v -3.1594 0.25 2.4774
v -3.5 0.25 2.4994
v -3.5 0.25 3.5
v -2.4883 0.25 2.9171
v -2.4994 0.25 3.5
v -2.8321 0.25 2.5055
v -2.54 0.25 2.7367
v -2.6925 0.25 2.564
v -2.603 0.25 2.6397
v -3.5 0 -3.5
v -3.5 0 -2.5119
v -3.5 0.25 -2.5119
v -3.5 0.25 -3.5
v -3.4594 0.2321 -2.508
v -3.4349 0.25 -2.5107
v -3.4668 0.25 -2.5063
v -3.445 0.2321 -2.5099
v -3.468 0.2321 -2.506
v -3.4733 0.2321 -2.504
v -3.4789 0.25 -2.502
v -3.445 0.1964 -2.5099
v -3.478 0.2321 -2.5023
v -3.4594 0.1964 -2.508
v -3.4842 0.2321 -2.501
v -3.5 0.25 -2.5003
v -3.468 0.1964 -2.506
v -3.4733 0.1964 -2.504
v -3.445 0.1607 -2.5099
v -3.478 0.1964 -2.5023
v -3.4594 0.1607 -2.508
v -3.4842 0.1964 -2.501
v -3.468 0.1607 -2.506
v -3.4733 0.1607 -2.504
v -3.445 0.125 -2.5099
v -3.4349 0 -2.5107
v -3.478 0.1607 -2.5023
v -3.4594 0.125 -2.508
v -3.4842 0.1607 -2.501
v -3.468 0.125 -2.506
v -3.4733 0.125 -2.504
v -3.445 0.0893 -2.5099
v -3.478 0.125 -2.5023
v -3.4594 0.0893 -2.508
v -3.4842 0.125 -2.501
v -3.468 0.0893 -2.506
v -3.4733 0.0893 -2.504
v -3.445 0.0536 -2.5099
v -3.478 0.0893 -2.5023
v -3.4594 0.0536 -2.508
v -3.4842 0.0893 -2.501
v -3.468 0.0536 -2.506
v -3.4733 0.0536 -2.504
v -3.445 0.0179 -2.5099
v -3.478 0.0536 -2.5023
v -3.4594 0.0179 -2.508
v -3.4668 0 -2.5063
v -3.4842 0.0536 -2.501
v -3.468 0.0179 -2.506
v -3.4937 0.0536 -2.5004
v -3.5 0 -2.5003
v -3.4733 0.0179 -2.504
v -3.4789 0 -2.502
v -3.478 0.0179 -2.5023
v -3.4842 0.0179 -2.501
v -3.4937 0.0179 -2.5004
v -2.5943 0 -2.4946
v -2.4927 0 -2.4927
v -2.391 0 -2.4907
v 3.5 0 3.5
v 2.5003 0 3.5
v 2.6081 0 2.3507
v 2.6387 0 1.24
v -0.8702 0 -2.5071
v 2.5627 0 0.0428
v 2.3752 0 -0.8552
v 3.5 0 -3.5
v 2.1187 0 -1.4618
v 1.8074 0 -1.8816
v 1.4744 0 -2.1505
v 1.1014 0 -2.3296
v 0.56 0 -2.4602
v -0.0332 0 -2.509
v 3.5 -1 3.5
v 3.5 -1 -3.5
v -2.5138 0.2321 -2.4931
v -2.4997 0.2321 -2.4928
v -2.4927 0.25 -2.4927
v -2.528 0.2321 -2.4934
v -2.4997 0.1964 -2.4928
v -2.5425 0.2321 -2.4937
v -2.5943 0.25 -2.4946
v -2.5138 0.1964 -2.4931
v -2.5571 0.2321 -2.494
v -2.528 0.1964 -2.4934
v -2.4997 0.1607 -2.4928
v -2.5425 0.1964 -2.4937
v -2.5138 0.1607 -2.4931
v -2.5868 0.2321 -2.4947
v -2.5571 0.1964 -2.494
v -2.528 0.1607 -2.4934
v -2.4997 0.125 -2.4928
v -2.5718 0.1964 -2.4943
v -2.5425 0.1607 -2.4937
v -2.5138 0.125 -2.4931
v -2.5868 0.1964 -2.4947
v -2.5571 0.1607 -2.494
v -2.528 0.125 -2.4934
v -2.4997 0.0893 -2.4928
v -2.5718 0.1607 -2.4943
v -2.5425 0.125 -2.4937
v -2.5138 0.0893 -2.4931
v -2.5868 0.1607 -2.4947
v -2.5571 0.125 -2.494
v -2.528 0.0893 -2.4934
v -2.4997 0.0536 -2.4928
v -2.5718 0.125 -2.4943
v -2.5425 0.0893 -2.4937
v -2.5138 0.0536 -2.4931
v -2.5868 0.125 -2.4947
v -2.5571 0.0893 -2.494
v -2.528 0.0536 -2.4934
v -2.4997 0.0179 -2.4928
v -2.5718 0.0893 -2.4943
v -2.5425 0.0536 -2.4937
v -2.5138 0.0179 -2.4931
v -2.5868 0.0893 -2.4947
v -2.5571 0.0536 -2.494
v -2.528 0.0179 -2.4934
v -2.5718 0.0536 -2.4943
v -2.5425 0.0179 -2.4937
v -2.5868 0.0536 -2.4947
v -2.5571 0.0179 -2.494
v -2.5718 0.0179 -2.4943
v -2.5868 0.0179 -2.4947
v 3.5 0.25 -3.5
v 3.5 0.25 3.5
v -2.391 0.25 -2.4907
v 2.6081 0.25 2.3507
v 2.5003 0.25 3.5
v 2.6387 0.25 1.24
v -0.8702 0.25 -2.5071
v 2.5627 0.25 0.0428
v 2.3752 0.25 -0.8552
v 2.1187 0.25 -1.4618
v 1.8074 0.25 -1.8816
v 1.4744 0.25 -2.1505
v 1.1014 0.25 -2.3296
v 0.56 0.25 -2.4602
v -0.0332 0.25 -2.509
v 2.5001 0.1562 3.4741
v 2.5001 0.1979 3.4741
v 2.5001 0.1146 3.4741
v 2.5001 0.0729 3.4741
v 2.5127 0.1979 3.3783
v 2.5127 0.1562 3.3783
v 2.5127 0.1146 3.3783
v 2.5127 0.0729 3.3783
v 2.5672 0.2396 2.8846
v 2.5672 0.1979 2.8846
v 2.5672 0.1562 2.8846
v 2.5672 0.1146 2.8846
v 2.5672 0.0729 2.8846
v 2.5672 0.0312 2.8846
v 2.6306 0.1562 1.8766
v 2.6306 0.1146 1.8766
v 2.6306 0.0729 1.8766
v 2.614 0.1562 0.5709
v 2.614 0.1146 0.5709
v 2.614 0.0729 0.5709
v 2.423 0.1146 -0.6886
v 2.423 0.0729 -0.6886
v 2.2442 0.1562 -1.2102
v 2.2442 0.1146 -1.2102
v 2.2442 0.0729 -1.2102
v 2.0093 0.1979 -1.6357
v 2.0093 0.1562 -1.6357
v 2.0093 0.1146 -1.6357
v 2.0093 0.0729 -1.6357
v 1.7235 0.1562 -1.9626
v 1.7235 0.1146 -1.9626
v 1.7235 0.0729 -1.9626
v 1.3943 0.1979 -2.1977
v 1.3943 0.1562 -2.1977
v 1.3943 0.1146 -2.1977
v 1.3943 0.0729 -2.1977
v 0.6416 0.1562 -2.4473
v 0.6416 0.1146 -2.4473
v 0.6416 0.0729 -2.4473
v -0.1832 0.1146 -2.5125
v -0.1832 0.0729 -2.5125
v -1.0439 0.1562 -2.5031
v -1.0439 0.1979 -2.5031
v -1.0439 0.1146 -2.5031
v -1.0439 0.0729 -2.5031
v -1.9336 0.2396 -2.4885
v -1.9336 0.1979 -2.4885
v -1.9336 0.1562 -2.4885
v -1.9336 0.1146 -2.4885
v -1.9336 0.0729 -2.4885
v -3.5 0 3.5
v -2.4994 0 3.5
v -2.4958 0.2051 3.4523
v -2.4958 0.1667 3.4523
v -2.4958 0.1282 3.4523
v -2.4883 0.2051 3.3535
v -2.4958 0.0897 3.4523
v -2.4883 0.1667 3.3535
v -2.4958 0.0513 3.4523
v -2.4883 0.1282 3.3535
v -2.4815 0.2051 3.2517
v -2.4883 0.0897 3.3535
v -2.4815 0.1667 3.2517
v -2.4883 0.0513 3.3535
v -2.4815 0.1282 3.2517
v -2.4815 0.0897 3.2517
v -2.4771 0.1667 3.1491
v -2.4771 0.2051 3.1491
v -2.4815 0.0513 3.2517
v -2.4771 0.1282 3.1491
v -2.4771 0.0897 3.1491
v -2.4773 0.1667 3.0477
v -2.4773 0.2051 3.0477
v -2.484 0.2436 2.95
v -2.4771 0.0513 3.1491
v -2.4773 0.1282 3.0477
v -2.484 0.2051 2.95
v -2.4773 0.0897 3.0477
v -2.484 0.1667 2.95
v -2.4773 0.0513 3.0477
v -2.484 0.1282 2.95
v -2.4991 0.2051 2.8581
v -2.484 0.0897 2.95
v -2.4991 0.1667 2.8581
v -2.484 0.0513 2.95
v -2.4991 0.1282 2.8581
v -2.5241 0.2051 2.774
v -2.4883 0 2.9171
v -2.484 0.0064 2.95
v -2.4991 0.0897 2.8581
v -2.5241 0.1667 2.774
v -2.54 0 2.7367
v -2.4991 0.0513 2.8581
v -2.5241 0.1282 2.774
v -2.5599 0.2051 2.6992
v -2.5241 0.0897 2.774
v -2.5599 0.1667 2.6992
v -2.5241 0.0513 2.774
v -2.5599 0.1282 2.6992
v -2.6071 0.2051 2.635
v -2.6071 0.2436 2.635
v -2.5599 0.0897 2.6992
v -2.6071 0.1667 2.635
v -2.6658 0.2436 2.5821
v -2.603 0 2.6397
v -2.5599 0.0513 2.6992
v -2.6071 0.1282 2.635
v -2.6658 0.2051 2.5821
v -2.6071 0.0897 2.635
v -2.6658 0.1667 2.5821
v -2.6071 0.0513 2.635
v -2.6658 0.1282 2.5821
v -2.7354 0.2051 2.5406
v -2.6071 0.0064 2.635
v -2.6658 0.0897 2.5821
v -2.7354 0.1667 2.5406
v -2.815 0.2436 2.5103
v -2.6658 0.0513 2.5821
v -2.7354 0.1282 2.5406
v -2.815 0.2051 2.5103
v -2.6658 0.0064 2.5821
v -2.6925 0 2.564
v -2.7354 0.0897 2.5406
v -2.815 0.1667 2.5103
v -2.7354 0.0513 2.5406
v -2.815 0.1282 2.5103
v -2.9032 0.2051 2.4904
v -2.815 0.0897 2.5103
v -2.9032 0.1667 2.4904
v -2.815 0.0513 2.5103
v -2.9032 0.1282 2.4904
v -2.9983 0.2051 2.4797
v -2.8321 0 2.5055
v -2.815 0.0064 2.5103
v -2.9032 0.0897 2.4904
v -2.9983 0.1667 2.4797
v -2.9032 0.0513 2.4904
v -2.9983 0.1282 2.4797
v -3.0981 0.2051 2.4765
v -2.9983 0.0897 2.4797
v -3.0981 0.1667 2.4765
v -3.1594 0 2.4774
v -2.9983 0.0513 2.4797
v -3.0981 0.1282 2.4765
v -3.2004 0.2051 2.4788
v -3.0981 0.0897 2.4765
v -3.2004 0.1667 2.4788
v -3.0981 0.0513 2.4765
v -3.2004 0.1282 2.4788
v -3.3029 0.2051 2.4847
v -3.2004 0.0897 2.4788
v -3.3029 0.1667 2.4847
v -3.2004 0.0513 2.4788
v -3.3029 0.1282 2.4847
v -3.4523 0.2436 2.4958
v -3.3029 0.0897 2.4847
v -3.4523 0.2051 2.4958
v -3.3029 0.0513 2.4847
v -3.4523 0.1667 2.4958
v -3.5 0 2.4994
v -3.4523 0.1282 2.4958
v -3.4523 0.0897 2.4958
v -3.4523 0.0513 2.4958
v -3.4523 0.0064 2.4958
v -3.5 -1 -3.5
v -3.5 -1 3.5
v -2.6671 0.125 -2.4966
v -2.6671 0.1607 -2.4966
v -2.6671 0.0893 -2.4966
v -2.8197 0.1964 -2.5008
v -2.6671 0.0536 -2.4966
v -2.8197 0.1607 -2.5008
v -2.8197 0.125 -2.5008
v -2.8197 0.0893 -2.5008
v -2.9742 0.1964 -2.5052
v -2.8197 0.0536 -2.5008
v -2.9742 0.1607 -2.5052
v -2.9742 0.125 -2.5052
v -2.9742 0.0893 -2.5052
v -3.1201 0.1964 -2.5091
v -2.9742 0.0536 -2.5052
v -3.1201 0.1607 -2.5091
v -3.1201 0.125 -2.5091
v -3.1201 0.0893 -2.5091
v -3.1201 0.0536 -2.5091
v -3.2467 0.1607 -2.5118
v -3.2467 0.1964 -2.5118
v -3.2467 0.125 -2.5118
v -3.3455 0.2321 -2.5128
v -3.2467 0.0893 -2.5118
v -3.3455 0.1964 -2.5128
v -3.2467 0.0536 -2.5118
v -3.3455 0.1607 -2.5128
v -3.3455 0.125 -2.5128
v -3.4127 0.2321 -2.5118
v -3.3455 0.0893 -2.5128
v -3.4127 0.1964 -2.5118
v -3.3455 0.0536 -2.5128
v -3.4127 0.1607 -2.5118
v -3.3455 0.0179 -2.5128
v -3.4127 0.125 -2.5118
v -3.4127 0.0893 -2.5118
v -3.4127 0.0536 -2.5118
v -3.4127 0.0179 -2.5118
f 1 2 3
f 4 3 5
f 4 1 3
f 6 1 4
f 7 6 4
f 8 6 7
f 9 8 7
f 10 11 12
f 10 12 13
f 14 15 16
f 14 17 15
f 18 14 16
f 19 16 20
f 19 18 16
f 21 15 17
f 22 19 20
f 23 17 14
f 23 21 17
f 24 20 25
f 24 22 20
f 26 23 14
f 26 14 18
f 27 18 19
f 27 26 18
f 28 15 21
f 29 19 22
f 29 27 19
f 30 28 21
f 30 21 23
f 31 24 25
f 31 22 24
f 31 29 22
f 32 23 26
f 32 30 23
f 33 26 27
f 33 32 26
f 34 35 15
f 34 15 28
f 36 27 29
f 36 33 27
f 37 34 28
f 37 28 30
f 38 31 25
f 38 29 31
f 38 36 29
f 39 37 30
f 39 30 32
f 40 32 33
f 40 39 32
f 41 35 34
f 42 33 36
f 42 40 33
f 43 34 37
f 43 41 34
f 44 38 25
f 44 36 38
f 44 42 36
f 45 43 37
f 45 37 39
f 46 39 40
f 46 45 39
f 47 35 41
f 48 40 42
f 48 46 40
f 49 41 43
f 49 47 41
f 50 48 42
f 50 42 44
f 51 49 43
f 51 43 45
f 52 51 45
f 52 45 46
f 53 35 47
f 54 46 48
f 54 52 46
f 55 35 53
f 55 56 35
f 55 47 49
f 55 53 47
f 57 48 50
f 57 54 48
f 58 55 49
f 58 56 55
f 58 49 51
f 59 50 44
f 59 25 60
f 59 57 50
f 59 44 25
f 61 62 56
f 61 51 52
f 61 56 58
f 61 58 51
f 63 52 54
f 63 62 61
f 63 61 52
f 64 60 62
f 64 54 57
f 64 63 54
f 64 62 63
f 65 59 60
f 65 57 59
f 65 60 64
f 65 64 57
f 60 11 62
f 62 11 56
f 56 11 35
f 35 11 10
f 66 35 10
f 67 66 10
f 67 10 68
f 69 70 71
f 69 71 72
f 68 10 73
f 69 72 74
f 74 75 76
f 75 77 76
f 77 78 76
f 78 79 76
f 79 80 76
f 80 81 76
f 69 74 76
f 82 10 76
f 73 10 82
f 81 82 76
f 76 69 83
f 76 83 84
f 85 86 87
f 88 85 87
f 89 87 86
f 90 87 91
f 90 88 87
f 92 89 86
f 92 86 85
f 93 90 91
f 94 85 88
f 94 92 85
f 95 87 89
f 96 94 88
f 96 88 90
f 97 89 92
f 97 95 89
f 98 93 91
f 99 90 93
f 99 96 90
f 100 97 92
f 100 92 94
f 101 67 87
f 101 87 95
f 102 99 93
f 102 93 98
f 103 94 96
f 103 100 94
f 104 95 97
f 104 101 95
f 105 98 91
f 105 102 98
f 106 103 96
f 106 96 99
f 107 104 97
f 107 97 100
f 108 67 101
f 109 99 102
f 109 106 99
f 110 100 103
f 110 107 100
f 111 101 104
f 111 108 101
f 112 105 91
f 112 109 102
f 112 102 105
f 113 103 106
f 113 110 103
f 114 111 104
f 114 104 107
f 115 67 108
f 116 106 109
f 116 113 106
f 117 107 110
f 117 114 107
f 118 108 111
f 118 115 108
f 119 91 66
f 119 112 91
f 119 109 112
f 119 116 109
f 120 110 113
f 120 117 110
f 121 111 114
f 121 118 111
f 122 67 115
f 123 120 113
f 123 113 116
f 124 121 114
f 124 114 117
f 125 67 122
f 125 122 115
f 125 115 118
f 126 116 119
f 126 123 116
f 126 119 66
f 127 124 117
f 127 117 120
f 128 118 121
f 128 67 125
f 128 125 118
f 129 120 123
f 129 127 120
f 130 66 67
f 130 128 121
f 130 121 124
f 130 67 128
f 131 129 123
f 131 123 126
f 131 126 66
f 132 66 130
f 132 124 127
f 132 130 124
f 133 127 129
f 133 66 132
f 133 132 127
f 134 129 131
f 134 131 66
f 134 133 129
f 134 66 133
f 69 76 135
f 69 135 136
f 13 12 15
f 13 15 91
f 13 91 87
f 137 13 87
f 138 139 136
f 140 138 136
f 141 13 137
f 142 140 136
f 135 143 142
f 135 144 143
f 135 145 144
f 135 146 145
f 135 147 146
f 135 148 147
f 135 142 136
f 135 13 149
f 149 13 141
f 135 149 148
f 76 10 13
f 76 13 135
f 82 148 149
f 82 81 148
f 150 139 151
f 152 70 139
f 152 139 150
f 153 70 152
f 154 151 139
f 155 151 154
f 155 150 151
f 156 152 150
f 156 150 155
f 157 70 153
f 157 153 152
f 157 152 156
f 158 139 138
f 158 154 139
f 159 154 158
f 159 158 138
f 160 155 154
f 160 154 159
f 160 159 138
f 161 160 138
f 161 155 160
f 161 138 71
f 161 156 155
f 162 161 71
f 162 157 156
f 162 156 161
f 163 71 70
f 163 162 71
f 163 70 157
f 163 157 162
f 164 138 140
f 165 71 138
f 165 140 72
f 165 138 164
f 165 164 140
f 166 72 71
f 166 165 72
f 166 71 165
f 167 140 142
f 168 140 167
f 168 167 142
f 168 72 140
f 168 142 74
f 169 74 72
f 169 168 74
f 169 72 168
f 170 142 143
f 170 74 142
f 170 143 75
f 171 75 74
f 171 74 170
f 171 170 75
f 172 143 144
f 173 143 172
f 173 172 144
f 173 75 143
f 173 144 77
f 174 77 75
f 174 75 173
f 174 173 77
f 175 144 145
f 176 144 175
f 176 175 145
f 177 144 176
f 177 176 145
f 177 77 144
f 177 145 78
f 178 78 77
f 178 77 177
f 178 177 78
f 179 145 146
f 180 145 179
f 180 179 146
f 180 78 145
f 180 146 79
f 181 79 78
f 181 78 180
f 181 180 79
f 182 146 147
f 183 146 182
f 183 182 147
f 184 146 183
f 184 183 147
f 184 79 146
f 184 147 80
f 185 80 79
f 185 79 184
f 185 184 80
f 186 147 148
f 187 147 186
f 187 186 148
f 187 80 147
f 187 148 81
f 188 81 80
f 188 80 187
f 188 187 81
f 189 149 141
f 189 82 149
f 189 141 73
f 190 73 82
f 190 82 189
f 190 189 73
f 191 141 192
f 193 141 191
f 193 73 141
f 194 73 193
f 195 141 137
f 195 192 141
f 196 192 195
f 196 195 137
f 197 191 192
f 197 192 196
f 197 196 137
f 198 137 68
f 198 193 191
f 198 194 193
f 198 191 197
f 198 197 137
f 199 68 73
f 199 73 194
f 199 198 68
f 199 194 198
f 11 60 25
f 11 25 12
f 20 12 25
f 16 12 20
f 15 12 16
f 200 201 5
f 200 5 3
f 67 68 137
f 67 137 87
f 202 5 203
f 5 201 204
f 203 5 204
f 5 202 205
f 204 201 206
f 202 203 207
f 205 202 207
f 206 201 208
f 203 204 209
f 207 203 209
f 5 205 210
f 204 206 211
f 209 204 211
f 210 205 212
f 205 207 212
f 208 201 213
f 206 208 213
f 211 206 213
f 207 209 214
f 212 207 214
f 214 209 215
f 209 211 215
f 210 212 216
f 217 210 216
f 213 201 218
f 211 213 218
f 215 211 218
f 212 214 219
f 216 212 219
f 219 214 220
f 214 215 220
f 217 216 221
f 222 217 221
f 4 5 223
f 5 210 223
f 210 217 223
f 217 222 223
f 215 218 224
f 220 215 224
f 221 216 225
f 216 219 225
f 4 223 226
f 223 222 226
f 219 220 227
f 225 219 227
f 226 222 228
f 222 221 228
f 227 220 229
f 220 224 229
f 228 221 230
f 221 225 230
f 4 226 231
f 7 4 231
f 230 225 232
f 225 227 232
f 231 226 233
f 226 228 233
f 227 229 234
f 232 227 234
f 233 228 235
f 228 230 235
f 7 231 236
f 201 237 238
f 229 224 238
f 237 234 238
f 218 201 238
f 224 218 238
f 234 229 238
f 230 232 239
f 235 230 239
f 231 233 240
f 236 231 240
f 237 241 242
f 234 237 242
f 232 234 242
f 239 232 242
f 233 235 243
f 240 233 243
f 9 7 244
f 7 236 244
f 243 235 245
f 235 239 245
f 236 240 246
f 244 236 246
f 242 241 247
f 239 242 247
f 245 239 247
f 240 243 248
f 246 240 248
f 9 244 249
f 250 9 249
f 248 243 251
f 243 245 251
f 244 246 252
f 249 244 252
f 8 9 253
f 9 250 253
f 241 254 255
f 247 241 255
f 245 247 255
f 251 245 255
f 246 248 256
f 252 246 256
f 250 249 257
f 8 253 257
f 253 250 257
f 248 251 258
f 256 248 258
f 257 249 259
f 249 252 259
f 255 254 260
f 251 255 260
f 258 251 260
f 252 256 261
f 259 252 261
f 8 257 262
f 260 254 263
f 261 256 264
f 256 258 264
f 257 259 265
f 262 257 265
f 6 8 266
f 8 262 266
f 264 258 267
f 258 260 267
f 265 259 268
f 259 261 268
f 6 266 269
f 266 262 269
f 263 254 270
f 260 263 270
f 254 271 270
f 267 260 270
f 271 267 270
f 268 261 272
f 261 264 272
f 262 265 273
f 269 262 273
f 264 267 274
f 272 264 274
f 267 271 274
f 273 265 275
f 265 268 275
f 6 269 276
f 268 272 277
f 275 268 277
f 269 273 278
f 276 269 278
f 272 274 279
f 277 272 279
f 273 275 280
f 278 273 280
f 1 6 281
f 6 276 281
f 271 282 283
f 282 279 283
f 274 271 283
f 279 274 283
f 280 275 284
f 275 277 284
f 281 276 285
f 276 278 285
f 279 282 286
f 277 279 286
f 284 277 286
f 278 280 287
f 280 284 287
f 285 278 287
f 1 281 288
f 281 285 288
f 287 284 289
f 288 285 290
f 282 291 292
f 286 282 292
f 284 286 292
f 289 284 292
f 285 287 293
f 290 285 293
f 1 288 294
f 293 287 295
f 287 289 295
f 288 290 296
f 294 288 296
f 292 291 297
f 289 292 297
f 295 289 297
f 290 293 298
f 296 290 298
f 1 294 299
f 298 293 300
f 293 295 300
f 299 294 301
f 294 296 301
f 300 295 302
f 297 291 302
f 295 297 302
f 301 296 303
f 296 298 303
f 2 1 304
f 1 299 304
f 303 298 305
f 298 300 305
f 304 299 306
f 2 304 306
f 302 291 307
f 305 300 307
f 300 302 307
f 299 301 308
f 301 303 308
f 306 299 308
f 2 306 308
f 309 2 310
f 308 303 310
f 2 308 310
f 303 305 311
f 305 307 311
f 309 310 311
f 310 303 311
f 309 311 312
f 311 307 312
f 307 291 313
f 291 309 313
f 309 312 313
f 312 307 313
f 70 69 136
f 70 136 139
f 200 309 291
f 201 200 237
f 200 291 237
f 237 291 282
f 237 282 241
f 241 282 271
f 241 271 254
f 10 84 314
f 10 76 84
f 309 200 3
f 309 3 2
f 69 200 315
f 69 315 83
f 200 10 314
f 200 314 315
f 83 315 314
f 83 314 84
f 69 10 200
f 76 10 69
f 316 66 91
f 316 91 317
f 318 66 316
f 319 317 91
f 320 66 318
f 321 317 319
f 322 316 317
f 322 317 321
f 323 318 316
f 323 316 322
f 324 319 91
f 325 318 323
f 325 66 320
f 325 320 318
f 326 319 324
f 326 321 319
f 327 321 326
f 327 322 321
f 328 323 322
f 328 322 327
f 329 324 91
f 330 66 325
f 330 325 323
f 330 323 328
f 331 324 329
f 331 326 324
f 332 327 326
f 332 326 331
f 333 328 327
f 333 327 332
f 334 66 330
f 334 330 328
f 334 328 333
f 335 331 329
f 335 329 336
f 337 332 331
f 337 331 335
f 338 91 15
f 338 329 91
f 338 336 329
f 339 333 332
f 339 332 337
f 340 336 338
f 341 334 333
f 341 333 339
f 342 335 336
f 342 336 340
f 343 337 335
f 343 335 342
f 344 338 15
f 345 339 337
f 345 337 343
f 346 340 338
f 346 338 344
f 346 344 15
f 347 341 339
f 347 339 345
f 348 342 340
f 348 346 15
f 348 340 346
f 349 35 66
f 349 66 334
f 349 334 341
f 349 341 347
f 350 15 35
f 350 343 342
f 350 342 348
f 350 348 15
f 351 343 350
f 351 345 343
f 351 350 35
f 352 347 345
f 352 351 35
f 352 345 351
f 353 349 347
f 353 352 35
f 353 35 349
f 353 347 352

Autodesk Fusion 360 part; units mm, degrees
sketch "Sketch1" plane through (0, 0, 0) normal (0, 1, 0) x (1, 0, 0)
  line L0 (3.5, -3.5) -> (-3.5, -3.5)
  line L1 (-3.5, -3.5) -> (-3.5, 3.5)
  line L2 (-3.5, 3.5) -> (3.5, 3.5)
  line L3 (3.5, 3.5) -> (3.5, -3.5)
  line L4 (3.5, -3.5) -> (-3.5, 3.5) construction
  line L5 (-3.5, -3.5) -> (3.5, 3.5) construction
  line L6 (-3.5, 0) -> (3.5, 0) construction
  line L7 (0, 3.5) -> (0, -3.5) construction
  spline S0 degree 5 poles (-2.4495, -4.0862) (-2.4531, -4.0821) (-2.4598, -4.073) (-2.4693, -4.0564) (-2.4806, -4.0283) (-2.4922, -3.9831) (-2.5012, -3.9279) (-2.5076, -3.8624) (-2.5108, -3.7868) (-2.5105, -3.701) (-2.5067, -3.6054) (-2.4998, -3.501) (-2.4909, -3.3892) (-2.482, -3.2726) (-2.4758, -3.1541) (-2.4754, -3.0372) (-2.4839, -2.9253) (-2.5041, -2.8219) (-2.538, -2.7297) (-2.5868, -2.6509) (-2.6509, -2.5868) (-2.7297, -2.538) (-2.8219, -2.5041) (-2.9253, -2.4839) (-3.0372, -2.4754) (-3.1541, -2.4758) (-3.2726, -2.482) (-3.3892, -2.4909) (-3.501, -2.4998) (-3.6054, -2.5067) (-3.701, -2.5105) (-3.7868, -2.5108) (-3.8624, -2.5076) (-3.9279, -2.5012) (-3.9831, -2.4922) (-4.0283, -2.4806) (-4.0564, -2.4693) (-4.073, -2.4599) (-4.0821, -2.4531) (-4.0862, -2.4495) knots 0 0 0 0 0 0 0.028571 0.057143 0.085714 0.114286 0.142857 0.171429 0.2 0.228571 0.257143 0.285714 0.314286 0.342857 0.371429 0.4 0.428571 0.457143 0.485714 0.514286 0.542857 0.571429 0.6 0.628571 0.657143 0.685714 0.714286 0.742857 0.771429 0.8 0.828571 0.857143 0.885714 0.914286 0.942857 0.971429 1 1 1 1 1 1
  spline S1 degree 5 poles (-3.5, 2.5003) (-3.592, 2.5004) (-3.7772, 2.4999) (-4.0588, 2.4968) (-4.4399, 2.4888) (-4.9136, 2.4773) (-5.3682, 2.4705) (-5.787, 2.4753) (-6.1548, 2.4975) (-6.4627, 2.5408) (-6.7098, 2.6058) (-6.8605, 2.6746) (-6.9484, 2.7352) (-6.9959, 2.7796) (-7.017, 2.8028) knots 0 0 0 0 0 0 0.1 0.2 0.3 0.4 0.5 0.6 0.7 0.8 0.9 1 1 1 1 1 1
  line L8 (-3.1261, 2.4997) -> (-3.8739, 2.5008)
  spline S2 degree 5 poles (-2.4927, 2.4927) (-2.524, 2.4933) (-2.5888, 2.4946) (-2.6927, 2.4972) (-2.8416, 2.5014) (-3.0292, 2.5069) (-3.199, 2.5113) (-3.3329, 2.5134) (-3.4194, 2.5126) (-3.4604, 2.5092) (-3.4728, 2.5048) (-3.4769, 2.5018) (-3.4853, 2.5005) (-3.4945, 2.5003) (-3.5, 2.5003) knots 0 0 0 0 0 0 0.1 0.2 0.3 0.4 0.5 0.6 0.7 0.8 0.9 1 1 1 1 1 1
  line L9 (-2.391, 2.4907) -> (-2.5943, 2.4946)
  line L10 (-3.398, 2.5001) -> (-3.602, 2.5004)
  spline S3 degree 5 poles (2.8028, -7.0169) (2.7796, -6.9959) (2.7352, -6.9484) (2.6746, -6.8605) (2.6058, -6.7098) (2.5409, -6.4627) (2.4975, -6.1548) (2.4753, -5.787) (2.4705, -5.3682) (2.4773, -4.9135) (2.4888, -4.4399) (2.4968, -4.0588) (2.4999, -3.7772) (2.5004, -3.592) (2.5003, -3.5) knots 0 0 0 0 0 0 0.1 0.2 0.3 0.4 0.5 0.6 0.7 0.8 0.9 1 1 1 1 1 1
  line L11 (2.5009, -3.8739) -> (2.4997, -3.1261)
  spline S4 degree 5 poles (2.5003, -3.5) (2.5003, -3.4902) (2.5001, -3.4756) (2.4995, -3.4685) (2.5012, -3.4612) (2.5205, -3.3295) (2.5597, -2.9945) (2.6072, -2.4508) (2.6438, -1.7375) (2.6461, -0.9259) (2.5908, -0.0993) (2.4593, 0.6617) (2.2418, 1.2985) (1.941, 1.7877) (1.5675, 2.1302) (1.137, 2.345) (0.6663, 2.4609) (0.1707, 2.5098) (-0.3399, 2.5187) (-0.8612, 2.5083) (-1.3923, 2.4938) (-1.8259, 2.4871) (-2.1569, 2.4876) (-2.3803, 2.4905) (-2.4927, 2.4927) knots 0 0 0 0 0 0 0.05 0.1 0.15 0.2 0.25 0.3 0.35 0.4 0.45 0.5 0.55 0.6 0.65 0.7 0.75 0.8 0.85 0.9 0.95 1 1 1 1 1 1
  line L12 (2.5018, -4.529) -> (2.4988, -2.471)
  line L13 (-1.3885, 2.4716) -> (-3.5969, 2.5138)
  point P0 (-2.5013, -3.9197)
  point P1 (-2.4979, -3.4799)
  point P2 (-2.5053, -2.8327)
  point P3 (-2.8327, -2.5053)
  point P4 (-3.4799, -2.4979)
  point P5 (-3.9197, -2.5013)
  point P6 (2.4925, -6.018)
  point P7 (2.5126, -3.3792)
  point P8 (2.468, 0.5041)
  point P9 (0.5041, 2.468)
  point P10 (-3.3793, 2.5126)
  point P11 (-6.018, 2.4924)
  dimension "d1" = 0
  dimension "d2" = 0
sketch "Sketch2" plane through (0, 0, 0) normal (0, 1, 0) x (1, 0, 0)
  line L0 (3.5, 3.5) -> (-3.5, 3.5)
  line L1 (-3.5, 3.5) -> (-3.5, -3.5)
  line L2 (-3.5, -3.5) -> (3.5, -3.5)
  line L3 (3.5, -3.5) -> (3.5, 3.5)
  line L4 (3.5, 3.5) -> (-3.5, -3.5) construction
  line L5 (-3.5, 3.5) -> (3.5, -3.5) construction
  line L6 (2.5, -3.5) -> (2.5, 3.5)
  line L7 (-2.5, 3.5) -> (-2.5, -3.5)
  dimension "d3" = 0
  dimension "d4" = 0
  dimension "d5" = 0
  dimension "d6" = 0
extrude "Extrude2" add sketch "Sketch1" along normal blind 0.25 contours L0 L1 L2 L3 S2 L9 S4 L13 | L0 L1 S0 | L1 S2 L13 makes body 1 at (-3.004, 0, 3.0141) makes body 2 at (-0.0021, 0, -3.1694)
extrude "Extrude3" add sketch "Sketch2" against normal blind 1 separate body makes body 3
equation "d62 = curb_t"
equation "d80 = -tile_t"
equation "tile_t = 1 mm"
equation "curb_t = 0.25 mm"
equation "d1 = tile_size"
equation "d2 = tile_size"
equation "d3 = tile_size"
equation "d4 = tile_size"
equation "d5 = curb_w"
equation "d6 = curb_w"
